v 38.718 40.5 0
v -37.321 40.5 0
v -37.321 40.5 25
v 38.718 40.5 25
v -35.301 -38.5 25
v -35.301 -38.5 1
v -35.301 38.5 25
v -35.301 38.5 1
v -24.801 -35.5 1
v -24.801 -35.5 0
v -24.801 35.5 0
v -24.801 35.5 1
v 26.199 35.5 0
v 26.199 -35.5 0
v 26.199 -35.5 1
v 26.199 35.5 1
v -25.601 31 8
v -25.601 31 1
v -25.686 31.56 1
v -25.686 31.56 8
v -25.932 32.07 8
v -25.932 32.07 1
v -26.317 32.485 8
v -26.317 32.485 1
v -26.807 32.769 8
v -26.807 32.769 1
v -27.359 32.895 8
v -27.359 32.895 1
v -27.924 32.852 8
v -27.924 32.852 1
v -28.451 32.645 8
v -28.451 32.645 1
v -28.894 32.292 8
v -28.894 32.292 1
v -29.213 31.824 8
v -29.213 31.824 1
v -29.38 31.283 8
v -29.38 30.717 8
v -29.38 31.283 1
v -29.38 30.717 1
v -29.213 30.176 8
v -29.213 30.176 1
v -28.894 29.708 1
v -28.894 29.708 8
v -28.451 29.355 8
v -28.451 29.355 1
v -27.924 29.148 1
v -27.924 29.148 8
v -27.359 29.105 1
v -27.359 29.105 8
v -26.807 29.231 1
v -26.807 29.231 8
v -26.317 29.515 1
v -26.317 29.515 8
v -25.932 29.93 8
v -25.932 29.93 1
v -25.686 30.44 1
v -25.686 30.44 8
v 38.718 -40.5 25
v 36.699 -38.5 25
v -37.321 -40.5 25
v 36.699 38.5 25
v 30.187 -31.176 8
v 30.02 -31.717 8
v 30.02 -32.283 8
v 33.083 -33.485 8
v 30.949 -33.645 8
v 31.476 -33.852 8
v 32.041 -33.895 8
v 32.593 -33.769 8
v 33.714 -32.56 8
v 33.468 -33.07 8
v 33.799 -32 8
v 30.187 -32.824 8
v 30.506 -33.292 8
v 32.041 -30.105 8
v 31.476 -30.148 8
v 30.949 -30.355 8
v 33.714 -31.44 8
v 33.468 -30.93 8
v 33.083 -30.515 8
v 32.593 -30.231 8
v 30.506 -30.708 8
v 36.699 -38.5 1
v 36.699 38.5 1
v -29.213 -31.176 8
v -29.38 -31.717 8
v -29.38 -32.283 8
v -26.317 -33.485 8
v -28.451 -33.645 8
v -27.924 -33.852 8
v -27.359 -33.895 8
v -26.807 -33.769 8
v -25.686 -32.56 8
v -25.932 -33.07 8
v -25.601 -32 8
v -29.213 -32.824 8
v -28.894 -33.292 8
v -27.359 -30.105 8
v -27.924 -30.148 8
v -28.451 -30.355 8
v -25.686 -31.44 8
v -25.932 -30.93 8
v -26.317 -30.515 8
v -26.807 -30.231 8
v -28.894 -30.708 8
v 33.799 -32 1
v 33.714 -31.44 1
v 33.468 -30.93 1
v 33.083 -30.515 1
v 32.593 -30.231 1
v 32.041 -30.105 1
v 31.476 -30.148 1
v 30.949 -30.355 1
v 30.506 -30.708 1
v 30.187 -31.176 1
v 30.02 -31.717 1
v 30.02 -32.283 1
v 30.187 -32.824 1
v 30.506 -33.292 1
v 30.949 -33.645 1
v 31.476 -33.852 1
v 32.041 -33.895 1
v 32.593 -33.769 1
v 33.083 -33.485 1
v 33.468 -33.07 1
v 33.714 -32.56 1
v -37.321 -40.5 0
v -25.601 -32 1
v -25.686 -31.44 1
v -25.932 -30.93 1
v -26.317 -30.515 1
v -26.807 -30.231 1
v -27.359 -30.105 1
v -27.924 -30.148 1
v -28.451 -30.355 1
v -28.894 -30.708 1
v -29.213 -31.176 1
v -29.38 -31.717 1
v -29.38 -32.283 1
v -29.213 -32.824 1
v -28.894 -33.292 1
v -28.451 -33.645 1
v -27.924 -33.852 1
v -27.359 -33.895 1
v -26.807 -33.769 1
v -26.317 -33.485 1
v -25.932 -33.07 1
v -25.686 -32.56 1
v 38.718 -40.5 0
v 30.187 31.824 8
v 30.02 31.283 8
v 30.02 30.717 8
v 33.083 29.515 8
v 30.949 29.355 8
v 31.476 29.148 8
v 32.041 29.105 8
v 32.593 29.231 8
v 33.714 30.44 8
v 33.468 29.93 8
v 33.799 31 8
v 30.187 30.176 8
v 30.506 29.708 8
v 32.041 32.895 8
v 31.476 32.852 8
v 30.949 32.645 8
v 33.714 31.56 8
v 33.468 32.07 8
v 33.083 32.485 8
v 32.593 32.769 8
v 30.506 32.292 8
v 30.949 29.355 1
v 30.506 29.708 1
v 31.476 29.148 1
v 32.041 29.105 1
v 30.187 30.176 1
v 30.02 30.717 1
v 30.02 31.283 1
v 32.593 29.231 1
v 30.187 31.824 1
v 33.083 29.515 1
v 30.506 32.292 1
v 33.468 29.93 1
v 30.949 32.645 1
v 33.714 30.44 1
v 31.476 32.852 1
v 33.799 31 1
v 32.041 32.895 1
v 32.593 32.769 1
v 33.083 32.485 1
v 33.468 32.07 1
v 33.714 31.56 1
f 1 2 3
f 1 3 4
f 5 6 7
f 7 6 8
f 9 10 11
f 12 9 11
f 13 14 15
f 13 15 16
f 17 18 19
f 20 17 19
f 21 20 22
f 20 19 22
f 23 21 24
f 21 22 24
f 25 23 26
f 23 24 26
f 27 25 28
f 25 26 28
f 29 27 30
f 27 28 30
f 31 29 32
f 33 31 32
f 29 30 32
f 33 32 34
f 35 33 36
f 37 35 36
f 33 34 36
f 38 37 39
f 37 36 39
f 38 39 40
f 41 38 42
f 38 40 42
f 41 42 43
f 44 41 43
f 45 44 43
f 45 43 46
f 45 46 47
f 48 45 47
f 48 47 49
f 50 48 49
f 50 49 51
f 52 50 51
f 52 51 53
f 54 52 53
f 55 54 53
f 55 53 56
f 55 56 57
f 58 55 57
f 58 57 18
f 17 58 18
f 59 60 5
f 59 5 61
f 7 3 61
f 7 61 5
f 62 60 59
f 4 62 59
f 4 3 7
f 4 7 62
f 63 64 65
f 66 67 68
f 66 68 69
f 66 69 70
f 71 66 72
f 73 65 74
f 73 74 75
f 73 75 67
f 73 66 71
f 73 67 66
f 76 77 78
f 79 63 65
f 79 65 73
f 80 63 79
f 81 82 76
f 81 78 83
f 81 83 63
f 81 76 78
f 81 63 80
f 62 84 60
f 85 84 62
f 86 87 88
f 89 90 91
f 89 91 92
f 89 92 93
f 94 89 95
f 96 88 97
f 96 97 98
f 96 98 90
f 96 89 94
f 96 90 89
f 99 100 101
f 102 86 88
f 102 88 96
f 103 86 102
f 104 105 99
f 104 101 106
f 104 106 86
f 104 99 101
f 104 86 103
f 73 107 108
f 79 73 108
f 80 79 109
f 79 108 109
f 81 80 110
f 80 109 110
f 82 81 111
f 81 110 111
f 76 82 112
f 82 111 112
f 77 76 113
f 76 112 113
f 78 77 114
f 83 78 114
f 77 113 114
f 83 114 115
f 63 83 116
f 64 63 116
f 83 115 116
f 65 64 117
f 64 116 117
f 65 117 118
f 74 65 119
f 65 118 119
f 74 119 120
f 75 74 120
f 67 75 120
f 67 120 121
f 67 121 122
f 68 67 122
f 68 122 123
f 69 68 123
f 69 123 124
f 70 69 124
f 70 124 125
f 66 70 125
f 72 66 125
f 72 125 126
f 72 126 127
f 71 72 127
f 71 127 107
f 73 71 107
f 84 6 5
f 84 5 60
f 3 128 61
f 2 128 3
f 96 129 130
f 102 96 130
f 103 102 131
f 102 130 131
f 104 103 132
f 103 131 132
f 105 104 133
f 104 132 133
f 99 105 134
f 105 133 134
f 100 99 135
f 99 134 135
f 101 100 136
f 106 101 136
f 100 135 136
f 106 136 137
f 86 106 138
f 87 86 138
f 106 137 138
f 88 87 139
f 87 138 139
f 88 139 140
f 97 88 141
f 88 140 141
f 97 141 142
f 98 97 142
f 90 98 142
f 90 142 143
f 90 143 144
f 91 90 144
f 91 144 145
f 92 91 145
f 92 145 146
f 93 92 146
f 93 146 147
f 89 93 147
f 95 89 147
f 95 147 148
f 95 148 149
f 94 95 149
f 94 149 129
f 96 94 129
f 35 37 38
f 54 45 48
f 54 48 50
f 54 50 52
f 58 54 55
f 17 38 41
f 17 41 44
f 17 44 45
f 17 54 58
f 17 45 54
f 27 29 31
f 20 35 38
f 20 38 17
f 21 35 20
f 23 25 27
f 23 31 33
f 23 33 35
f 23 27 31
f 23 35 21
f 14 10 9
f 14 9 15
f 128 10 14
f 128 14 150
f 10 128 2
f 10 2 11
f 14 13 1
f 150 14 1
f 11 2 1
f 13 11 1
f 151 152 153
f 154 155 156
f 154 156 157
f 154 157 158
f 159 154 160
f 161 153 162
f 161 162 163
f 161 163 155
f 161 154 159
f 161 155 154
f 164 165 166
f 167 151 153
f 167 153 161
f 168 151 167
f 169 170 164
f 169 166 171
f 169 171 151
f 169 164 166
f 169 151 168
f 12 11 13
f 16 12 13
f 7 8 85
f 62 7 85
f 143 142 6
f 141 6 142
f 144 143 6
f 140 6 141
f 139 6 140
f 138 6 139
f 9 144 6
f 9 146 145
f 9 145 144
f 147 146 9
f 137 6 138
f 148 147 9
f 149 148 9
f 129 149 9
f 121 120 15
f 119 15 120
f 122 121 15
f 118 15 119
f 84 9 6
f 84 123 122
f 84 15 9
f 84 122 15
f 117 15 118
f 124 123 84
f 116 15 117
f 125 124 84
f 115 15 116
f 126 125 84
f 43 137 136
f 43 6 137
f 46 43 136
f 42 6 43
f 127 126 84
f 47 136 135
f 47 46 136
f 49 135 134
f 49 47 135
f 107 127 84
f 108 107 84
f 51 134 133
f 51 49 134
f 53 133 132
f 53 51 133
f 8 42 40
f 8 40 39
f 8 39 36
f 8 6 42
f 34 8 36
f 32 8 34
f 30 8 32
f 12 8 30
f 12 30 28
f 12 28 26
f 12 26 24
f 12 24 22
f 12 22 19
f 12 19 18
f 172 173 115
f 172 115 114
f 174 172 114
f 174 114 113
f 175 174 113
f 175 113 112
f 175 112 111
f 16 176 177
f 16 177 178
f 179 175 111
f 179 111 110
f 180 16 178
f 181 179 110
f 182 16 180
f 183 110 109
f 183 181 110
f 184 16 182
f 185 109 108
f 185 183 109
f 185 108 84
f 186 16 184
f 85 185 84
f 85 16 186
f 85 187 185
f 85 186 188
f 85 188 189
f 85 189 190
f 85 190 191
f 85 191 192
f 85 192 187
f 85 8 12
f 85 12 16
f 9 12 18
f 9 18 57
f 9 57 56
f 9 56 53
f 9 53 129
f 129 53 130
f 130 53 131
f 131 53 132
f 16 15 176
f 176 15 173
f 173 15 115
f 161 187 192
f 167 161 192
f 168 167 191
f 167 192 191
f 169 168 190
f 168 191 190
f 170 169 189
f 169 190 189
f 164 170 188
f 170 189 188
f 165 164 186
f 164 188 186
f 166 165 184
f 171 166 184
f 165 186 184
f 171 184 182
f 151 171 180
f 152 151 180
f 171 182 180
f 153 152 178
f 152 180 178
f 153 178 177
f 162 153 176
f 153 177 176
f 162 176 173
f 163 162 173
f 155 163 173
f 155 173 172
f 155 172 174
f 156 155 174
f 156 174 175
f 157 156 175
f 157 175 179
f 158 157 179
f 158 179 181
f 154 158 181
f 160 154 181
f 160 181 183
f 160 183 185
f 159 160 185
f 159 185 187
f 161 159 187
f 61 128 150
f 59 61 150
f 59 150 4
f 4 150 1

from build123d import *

# Parameters (mm, degrees)
F0_W     = 76.039264
F0_H     = 81
F0_W_2   = 72
F0_H_2   = 77
F0_R     = 1.9
F0_W_3   = 51
F0_H_3   = 71
F1_DEPTH = 1
F2_DEPTH = 25
F3_DEPTH = 8


with BuildPart() as f1:
    # F0 (on Top) → F1 (new body)
    with BuildSketch(Plane.XY):
        with Locations((0.69853, 0)):
            Rectangle(F0_W, F0_H)
        with Locations((0.69853, 0)):
            Rectangle(F0_W_2, F0_H_2, mode=Mode.SUBTRACT)
        with Locations((0.69853, 0)):
            Rectangle(F0_W_2, F0_H_2)
        with Locations((-27.50147, -32)):
            Circle(F0_R, mode=Mode.SUBTRACT)
        with Locations((31.89853, -32)):
            Circle(F0_R, mode=Mode.SUBTRACT)
        with Locations((-27.50147, 31)):
            Circle(F0_R, mode=Mode.SUBTRACT)
        with Locations((0.69853, 0)):
            Rectangle(F0_W_3, F0_H_3, mode=Mode.SUBTRACT)
        with Locations((31.89853, 31)):
            Circle(F0_R, mode=Mode.SUBTRACT)
        with Locations((31.89853, 31)):
            Circle(F0_R)
        with Locations((-27.50147, 31)):
            Circle(F0_R)
        with Locations((-27.50147, -32)):
            Circle(F0_R)
        with Locations((31.89853, -32)):
            Circle(F0_R)
    extrude(amount=F1_DEPTH)

    # F0 (on Top) → F2 (join)
    with BuildSketch(Plane.XY):
        with Locations((0.69853, 0)):
            Rectangle(F0_W, F0_H)
        with Locations((0.69853, 0)):
            Rectangle(F0_W_2, F0_H_2, mode=Mode.SUBTRACT)
    extrude(amount=F2_DEPTH)

    # F0 (on Top) → F3 (join)
    with BuildSketch(Plane.XY):
        with Locations((-27.50147, 31)):
            Circle(F0_R)
        with Locations((31.89853, 31)):
            Circle(F0_R)
        with Locations((-27.50147, -32)):
            Circle(F0_R)
        with Locations((31.89853, -32)):
            Circle(F0_R)
    extrude(amount=F3_DEPTH)


solid = f1.part
